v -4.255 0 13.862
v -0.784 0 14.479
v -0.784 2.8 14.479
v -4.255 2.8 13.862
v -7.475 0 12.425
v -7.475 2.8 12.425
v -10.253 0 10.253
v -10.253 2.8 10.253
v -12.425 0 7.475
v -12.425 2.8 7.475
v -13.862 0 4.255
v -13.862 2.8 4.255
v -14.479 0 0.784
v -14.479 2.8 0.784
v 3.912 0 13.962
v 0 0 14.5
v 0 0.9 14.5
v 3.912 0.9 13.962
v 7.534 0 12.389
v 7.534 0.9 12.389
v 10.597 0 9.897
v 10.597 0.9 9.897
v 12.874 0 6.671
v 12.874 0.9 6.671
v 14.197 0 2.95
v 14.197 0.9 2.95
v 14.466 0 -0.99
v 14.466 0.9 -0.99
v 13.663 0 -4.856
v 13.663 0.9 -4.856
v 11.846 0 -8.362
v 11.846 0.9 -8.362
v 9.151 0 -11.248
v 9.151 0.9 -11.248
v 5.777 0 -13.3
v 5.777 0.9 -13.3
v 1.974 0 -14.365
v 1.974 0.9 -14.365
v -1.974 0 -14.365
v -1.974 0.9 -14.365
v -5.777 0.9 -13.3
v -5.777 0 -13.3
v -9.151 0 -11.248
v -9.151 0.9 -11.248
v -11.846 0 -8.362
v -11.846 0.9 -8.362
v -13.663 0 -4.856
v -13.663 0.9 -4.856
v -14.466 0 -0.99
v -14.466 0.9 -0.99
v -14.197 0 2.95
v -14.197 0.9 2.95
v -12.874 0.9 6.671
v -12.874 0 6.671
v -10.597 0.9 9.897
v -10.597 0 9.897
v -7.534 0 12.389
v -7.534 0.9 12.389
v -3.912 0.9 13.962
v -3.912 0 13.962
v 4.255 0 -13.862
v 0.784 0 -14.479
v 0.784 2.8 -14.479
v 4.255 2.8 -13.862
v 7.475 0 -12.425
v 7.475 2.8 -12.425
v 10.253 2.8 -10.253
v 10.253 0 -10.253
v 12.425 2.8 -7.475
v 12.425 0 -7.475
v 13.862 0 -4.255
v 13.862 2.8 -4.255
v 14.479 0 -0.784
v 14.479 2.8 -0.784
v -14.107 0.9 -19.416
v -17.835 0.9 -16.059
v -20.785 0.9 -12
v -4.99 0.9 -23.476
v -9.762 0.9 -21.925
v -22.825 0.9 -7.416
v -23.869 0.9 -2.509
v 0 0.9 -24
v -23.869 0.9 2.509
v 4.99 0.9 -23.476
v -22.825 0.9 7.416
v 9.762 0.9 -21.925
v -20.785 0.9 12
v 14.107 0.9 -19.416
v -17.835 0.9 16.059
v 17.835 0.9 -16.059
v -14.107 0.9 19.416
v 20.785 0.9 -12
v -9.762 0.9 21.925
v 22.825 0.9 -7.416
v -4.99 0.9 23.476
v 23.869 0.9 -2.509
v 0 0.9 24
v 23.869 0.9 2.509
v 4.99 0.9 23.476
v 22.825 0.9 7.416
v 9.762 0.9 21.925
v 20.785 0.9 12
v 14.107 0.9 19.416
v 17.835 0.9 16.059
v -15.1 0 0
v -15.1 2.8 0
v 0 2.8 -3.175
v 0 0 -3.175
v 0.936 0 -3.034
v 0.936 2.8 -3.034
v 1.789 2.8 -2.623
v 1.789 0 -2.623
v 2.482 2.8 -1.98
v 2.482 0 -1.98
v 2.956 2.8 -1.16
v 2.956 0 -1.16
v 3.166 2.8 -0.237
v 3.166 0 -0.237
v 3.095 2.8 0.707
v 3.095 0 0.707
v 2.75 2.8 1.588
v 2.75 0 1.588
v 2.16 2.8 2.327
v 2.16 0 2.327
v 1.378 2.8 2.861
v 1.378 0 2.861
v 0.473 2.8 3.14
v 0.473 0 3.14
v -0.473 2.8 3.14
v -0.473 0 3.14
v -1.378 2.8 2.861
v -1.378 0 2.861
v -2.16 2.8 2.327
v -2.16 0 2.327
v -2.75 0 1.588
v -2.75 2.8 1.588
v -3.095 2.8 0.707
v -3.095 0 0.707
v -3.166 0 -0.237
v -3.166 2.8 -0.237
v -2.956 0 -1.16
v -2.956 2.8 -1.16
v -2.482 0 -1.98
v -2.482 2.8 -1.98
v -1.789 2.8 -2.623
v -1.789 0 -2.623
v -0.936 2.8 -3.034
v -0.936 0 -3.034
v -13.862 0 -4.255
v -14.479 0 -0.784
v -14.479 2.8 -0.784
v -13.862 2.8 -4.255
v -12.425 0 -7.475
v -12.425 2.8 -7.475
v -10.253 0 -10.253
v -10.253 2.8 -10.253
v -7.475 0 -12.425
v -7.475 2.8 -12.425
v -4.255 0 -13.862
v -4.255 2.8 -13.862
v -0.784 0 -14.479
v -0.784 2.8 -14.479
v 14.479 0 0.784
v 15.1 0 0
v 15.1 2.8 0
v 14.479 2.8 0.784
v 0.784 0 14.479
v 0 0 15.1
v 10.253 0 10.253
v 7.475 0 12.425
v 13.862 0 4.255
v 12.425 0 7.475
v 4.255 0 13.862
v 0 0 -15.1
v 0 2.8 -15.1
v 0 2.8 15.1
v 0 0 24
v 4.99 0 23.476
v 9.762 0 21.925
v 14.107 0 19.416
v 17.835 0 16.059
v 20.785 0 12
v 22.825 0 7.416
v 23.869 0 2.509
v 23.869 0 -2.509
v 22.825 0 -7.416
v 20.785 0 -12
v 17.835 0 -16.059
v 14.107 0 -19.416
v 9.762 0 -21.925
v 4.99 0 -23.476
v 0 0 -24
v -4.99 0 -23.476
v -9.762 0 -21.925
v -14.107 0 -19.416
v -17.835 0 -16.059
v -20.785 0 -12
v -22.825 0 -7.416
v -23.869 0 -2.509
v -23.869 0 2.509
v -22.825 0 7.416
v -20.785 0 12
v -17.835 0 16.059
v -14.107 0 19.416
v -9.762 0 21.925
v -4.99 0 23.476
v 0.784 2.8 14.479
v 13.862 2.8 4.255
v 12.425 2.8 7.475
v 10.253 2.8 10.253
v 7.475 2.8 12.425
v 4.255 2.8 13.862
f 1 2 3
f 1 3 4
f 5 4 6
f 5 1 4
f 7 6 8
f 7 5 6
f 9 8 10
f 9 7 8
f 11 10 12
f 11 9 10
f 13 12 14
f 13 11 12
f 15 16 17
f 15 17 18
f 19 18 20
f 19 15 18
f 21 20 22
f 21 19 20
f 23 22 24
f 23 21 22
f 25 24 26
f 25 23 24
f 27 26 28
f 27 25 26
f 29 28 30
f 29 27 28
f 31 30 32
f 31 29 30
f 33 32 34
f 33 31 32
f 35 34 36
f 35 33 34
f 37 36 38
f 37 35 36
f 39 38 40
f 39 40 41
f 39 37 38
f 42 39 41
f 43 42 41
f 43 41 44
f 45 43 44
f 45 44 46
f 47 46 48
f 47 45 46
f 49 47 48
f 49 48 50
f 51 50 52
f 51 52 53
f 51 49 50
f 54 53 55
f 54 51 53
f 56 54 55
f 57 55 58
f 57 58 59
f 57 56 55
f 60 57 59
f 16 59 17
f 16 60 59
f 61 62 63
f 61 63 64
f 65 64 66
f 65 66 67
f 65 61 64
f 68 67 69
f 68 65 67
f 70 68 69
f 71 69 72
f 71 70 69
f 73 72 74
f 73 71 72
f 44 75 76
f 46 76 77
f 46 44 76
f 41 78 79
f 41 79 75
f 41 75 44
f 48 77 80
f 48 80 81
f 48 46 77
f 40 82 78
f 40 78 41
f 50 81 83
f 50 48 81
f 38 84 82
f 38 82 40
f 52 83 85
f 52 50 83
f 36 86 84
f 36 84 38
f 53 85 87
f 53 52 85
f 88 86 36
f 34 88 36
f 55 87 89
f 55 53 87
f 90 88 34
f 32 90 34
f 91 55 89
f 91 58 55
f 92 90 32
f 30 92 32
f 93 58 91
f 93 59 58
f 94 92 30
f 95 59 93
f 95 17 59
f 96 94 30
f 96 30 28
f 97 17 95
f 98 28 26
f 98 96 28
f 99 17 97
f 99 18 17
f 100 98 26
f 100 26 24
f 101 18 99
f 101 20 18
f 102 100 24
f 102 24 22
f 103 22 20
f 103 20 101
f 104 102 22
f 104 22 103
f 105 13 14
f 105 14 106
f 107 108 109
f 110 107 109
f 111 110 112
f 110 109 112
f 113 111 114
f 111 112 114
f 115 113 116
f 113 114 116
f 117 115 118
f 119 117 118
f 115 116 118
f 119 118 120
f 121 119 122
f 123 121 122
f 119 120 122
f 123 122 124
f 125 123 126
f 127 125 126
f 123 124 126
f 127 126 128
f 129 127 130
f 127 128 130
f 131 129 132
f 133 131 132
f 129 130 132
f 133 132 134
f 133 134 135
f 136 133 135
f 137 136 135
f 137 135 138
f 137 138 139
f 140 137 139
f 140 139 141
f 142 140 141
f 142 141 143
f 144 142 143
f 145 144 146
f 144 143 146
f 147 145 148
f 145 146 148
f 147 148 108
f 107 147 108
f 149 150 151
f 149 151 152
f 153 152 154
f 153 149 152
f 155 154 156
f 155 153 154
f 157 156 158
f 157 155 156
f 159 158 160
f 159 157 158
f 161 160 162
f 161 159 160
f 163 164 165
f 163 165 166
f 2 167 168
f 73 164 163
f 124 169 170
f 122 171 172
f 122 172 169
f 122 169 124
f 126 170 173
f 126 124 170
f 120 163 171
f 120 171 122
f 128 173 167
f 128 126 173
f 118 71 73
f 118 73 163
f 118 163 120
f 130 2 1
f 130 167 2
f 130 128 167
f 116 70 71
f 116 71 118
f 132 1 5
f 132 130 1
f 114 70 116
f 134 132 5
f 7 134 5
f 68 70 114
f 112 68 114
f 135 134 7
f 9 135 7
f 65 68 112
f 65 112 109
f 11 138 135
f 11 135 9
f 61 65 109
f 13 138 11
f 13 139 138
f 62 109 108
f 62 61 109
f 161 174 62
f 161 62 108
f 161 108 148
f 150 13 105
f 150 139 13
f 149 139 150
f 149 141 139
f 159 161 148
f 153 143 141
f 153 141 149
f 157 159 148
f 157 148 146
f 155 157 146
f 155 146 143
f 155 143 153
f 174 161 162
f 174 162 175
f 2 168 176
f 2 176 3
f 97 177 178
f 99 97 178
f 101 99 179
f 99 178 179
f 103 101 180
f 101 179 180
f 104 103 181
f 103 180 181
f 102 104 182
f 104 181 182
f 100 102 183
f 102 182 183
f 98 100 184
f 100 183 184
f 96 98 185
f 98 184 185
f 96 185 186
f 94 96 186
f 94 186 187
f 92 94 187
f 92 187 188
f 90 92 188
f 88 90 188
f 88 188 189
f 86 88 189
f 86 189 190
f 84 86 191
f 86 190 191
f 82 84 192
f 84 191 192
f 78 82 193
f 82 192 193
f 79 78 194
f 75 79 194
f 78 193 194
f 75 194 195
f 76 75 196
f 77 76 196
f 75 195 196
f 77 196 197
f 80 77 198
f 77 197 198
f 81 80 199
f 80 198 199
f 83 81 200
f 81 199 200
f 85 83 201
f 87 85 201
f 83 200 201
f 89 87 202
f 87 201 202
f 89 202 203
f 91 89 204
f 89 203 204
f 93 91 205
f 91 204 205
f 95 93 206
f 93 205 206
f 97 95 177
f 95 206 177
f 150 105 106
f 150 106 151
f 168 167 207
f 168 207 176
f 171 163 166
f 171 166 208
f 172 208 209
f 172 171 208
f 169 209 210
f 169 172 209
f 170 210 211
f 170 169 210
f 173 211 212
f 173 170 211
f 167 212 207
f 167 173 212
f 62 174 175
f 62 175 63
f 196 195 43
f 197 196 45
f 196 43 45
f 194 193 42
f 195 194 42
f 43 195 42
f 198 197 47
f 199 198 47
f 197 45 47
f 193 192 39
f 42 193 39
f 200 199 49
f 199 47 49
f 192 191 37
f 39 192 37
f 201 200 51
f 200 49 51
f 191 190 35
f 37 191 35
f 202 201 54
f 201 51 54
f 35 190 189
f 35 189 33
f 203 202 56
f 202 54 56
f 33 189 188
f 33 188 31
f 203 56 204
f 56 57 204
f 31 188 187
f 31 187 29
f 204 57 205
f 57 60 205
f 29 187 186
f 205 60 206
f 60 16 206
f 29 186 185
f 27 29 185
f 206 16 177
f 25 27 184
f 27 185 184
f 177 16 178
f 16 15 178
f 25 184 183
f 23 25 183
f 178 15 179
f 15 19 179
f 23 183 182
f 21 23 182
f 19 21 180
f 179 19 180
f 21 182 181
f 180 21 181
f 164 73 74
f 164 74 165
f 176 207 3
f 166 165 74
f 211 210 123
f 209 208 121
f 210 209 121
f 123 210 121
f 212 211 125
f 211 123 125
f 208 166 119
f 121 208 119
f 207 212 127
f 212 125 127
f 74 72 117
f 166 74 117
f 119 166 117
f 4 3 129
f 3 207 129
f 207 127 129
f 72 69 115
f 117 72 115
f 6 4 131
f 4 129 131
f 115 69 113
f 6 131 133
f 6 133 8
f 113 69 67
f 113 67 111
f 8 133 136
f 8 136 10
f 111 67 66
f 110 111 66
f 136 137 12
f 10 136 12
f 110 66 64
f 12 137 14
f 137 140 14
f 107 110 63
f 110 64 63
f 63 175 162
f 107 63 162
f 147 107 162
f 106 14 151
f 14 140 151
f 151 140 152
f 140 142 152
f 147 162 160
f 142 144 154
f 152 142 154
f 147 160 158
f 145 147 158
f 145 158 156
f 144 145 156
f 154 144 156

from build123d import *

# Parameters (mm, degrees)
SKETCH1_R           = 24
SKETCH1_R_2         = 14.5
BOSS_EXTRUDE1_DEPTH = 0.9
SKETCH2_R           = 14.5
SKETCH2_R_2         = 3.175
BOSS_EXTRUDE2_DEPTH = 2.8
BOSS_EXTRUDE3_START = -2.8
BOSS_EXTRUDE3_DEPTH = 2.8


with BuildPart() as part:
    # Sketch1 → Boss-Extrude1 (new body)
    with BuildSketch(Plane(origin=(0, 0, 0), x_dir=(1, 0, 0), z_dir=(0, 1, 0))):
        with Locations(Location((0, 0, 0), (0, 0, 270))):
            Circle(SKETCH1_R)
        with Locations(Location((0, 0, 0), (0, 0, 270))):
            Circle(SKETCH1_R_2, mode=Mode.SUBTRACT)
    extrude(amount=BOSS_EXTRUDE1_DEPTH)


with BuildPart() as body_2:
    # Sketch2 → Boss-Extrude2 (new body)
    with BuildSketch(Plane.XZ):
        with Locations(Location((0, 0, 0), (0, 0, 270))):
            Circle(SKETCH2_R)
        with Locations(Location((0, 0, 0), (0, 0, 270))):
            Circle(SKETCH2_R_2, mode=Mode.SUBTRACT)
    extrude(amount=-BOSS_EXTRUDE2_DEPTH)

    # Sketch3 → Boss-Extrude3 (add)
    with BuildSketch(Plane(origin=(0, 2.8, 0), x_dir=(1, 0, 0), z_dir=(0, 1, 0)).offset(BOSS_EXTRUDE3_START)):
        with BuildLine():
            Line((-15.1, 0), (-14.478807947, 0.783658365))
            ThreePointArc((-14.478807947, 0.783658365), (-14.5, 0), (-14.478807947, -0.783658365))
            Line((-14.478807947, -0.783658365), (-15.1, 0))
        make_face()
        with BuildLine():
            Line((0, 15.1), (0.783658365, 14.478807947))
            ThreePointArc((0.783658365, 14.478807947), (0, 14.5), (-0.783658365, 14.478807947))
            Line((-0.783658365, 14.478807947), (0, 15.1))
        make_face()
        with BuildLine():
            Line((15.1, 0), (14.478807947, -0.783658365))
            ThreePointArc((14.478807947, -0.783658365), (14.5, 0), (14.478807947, 0.783658365))
            Line((14.478807947, 0.783658365), (15.1, 0))
        make_face()
        with BuildLine():
            Line((0, -15.1), (-0.783658365, -14.478807947))
            ThreePointArc((-0.783658365, -14.478807947), (0, -14.5), (0.783658365, -14.478807947))
            Line((0.783658365, -14.478807947), (0, -15.1))
        make_face()
    extrude(amount=BOSS_EXTRUDE3_DEPTH)


solid = Compound([part.part, body_2.part])
